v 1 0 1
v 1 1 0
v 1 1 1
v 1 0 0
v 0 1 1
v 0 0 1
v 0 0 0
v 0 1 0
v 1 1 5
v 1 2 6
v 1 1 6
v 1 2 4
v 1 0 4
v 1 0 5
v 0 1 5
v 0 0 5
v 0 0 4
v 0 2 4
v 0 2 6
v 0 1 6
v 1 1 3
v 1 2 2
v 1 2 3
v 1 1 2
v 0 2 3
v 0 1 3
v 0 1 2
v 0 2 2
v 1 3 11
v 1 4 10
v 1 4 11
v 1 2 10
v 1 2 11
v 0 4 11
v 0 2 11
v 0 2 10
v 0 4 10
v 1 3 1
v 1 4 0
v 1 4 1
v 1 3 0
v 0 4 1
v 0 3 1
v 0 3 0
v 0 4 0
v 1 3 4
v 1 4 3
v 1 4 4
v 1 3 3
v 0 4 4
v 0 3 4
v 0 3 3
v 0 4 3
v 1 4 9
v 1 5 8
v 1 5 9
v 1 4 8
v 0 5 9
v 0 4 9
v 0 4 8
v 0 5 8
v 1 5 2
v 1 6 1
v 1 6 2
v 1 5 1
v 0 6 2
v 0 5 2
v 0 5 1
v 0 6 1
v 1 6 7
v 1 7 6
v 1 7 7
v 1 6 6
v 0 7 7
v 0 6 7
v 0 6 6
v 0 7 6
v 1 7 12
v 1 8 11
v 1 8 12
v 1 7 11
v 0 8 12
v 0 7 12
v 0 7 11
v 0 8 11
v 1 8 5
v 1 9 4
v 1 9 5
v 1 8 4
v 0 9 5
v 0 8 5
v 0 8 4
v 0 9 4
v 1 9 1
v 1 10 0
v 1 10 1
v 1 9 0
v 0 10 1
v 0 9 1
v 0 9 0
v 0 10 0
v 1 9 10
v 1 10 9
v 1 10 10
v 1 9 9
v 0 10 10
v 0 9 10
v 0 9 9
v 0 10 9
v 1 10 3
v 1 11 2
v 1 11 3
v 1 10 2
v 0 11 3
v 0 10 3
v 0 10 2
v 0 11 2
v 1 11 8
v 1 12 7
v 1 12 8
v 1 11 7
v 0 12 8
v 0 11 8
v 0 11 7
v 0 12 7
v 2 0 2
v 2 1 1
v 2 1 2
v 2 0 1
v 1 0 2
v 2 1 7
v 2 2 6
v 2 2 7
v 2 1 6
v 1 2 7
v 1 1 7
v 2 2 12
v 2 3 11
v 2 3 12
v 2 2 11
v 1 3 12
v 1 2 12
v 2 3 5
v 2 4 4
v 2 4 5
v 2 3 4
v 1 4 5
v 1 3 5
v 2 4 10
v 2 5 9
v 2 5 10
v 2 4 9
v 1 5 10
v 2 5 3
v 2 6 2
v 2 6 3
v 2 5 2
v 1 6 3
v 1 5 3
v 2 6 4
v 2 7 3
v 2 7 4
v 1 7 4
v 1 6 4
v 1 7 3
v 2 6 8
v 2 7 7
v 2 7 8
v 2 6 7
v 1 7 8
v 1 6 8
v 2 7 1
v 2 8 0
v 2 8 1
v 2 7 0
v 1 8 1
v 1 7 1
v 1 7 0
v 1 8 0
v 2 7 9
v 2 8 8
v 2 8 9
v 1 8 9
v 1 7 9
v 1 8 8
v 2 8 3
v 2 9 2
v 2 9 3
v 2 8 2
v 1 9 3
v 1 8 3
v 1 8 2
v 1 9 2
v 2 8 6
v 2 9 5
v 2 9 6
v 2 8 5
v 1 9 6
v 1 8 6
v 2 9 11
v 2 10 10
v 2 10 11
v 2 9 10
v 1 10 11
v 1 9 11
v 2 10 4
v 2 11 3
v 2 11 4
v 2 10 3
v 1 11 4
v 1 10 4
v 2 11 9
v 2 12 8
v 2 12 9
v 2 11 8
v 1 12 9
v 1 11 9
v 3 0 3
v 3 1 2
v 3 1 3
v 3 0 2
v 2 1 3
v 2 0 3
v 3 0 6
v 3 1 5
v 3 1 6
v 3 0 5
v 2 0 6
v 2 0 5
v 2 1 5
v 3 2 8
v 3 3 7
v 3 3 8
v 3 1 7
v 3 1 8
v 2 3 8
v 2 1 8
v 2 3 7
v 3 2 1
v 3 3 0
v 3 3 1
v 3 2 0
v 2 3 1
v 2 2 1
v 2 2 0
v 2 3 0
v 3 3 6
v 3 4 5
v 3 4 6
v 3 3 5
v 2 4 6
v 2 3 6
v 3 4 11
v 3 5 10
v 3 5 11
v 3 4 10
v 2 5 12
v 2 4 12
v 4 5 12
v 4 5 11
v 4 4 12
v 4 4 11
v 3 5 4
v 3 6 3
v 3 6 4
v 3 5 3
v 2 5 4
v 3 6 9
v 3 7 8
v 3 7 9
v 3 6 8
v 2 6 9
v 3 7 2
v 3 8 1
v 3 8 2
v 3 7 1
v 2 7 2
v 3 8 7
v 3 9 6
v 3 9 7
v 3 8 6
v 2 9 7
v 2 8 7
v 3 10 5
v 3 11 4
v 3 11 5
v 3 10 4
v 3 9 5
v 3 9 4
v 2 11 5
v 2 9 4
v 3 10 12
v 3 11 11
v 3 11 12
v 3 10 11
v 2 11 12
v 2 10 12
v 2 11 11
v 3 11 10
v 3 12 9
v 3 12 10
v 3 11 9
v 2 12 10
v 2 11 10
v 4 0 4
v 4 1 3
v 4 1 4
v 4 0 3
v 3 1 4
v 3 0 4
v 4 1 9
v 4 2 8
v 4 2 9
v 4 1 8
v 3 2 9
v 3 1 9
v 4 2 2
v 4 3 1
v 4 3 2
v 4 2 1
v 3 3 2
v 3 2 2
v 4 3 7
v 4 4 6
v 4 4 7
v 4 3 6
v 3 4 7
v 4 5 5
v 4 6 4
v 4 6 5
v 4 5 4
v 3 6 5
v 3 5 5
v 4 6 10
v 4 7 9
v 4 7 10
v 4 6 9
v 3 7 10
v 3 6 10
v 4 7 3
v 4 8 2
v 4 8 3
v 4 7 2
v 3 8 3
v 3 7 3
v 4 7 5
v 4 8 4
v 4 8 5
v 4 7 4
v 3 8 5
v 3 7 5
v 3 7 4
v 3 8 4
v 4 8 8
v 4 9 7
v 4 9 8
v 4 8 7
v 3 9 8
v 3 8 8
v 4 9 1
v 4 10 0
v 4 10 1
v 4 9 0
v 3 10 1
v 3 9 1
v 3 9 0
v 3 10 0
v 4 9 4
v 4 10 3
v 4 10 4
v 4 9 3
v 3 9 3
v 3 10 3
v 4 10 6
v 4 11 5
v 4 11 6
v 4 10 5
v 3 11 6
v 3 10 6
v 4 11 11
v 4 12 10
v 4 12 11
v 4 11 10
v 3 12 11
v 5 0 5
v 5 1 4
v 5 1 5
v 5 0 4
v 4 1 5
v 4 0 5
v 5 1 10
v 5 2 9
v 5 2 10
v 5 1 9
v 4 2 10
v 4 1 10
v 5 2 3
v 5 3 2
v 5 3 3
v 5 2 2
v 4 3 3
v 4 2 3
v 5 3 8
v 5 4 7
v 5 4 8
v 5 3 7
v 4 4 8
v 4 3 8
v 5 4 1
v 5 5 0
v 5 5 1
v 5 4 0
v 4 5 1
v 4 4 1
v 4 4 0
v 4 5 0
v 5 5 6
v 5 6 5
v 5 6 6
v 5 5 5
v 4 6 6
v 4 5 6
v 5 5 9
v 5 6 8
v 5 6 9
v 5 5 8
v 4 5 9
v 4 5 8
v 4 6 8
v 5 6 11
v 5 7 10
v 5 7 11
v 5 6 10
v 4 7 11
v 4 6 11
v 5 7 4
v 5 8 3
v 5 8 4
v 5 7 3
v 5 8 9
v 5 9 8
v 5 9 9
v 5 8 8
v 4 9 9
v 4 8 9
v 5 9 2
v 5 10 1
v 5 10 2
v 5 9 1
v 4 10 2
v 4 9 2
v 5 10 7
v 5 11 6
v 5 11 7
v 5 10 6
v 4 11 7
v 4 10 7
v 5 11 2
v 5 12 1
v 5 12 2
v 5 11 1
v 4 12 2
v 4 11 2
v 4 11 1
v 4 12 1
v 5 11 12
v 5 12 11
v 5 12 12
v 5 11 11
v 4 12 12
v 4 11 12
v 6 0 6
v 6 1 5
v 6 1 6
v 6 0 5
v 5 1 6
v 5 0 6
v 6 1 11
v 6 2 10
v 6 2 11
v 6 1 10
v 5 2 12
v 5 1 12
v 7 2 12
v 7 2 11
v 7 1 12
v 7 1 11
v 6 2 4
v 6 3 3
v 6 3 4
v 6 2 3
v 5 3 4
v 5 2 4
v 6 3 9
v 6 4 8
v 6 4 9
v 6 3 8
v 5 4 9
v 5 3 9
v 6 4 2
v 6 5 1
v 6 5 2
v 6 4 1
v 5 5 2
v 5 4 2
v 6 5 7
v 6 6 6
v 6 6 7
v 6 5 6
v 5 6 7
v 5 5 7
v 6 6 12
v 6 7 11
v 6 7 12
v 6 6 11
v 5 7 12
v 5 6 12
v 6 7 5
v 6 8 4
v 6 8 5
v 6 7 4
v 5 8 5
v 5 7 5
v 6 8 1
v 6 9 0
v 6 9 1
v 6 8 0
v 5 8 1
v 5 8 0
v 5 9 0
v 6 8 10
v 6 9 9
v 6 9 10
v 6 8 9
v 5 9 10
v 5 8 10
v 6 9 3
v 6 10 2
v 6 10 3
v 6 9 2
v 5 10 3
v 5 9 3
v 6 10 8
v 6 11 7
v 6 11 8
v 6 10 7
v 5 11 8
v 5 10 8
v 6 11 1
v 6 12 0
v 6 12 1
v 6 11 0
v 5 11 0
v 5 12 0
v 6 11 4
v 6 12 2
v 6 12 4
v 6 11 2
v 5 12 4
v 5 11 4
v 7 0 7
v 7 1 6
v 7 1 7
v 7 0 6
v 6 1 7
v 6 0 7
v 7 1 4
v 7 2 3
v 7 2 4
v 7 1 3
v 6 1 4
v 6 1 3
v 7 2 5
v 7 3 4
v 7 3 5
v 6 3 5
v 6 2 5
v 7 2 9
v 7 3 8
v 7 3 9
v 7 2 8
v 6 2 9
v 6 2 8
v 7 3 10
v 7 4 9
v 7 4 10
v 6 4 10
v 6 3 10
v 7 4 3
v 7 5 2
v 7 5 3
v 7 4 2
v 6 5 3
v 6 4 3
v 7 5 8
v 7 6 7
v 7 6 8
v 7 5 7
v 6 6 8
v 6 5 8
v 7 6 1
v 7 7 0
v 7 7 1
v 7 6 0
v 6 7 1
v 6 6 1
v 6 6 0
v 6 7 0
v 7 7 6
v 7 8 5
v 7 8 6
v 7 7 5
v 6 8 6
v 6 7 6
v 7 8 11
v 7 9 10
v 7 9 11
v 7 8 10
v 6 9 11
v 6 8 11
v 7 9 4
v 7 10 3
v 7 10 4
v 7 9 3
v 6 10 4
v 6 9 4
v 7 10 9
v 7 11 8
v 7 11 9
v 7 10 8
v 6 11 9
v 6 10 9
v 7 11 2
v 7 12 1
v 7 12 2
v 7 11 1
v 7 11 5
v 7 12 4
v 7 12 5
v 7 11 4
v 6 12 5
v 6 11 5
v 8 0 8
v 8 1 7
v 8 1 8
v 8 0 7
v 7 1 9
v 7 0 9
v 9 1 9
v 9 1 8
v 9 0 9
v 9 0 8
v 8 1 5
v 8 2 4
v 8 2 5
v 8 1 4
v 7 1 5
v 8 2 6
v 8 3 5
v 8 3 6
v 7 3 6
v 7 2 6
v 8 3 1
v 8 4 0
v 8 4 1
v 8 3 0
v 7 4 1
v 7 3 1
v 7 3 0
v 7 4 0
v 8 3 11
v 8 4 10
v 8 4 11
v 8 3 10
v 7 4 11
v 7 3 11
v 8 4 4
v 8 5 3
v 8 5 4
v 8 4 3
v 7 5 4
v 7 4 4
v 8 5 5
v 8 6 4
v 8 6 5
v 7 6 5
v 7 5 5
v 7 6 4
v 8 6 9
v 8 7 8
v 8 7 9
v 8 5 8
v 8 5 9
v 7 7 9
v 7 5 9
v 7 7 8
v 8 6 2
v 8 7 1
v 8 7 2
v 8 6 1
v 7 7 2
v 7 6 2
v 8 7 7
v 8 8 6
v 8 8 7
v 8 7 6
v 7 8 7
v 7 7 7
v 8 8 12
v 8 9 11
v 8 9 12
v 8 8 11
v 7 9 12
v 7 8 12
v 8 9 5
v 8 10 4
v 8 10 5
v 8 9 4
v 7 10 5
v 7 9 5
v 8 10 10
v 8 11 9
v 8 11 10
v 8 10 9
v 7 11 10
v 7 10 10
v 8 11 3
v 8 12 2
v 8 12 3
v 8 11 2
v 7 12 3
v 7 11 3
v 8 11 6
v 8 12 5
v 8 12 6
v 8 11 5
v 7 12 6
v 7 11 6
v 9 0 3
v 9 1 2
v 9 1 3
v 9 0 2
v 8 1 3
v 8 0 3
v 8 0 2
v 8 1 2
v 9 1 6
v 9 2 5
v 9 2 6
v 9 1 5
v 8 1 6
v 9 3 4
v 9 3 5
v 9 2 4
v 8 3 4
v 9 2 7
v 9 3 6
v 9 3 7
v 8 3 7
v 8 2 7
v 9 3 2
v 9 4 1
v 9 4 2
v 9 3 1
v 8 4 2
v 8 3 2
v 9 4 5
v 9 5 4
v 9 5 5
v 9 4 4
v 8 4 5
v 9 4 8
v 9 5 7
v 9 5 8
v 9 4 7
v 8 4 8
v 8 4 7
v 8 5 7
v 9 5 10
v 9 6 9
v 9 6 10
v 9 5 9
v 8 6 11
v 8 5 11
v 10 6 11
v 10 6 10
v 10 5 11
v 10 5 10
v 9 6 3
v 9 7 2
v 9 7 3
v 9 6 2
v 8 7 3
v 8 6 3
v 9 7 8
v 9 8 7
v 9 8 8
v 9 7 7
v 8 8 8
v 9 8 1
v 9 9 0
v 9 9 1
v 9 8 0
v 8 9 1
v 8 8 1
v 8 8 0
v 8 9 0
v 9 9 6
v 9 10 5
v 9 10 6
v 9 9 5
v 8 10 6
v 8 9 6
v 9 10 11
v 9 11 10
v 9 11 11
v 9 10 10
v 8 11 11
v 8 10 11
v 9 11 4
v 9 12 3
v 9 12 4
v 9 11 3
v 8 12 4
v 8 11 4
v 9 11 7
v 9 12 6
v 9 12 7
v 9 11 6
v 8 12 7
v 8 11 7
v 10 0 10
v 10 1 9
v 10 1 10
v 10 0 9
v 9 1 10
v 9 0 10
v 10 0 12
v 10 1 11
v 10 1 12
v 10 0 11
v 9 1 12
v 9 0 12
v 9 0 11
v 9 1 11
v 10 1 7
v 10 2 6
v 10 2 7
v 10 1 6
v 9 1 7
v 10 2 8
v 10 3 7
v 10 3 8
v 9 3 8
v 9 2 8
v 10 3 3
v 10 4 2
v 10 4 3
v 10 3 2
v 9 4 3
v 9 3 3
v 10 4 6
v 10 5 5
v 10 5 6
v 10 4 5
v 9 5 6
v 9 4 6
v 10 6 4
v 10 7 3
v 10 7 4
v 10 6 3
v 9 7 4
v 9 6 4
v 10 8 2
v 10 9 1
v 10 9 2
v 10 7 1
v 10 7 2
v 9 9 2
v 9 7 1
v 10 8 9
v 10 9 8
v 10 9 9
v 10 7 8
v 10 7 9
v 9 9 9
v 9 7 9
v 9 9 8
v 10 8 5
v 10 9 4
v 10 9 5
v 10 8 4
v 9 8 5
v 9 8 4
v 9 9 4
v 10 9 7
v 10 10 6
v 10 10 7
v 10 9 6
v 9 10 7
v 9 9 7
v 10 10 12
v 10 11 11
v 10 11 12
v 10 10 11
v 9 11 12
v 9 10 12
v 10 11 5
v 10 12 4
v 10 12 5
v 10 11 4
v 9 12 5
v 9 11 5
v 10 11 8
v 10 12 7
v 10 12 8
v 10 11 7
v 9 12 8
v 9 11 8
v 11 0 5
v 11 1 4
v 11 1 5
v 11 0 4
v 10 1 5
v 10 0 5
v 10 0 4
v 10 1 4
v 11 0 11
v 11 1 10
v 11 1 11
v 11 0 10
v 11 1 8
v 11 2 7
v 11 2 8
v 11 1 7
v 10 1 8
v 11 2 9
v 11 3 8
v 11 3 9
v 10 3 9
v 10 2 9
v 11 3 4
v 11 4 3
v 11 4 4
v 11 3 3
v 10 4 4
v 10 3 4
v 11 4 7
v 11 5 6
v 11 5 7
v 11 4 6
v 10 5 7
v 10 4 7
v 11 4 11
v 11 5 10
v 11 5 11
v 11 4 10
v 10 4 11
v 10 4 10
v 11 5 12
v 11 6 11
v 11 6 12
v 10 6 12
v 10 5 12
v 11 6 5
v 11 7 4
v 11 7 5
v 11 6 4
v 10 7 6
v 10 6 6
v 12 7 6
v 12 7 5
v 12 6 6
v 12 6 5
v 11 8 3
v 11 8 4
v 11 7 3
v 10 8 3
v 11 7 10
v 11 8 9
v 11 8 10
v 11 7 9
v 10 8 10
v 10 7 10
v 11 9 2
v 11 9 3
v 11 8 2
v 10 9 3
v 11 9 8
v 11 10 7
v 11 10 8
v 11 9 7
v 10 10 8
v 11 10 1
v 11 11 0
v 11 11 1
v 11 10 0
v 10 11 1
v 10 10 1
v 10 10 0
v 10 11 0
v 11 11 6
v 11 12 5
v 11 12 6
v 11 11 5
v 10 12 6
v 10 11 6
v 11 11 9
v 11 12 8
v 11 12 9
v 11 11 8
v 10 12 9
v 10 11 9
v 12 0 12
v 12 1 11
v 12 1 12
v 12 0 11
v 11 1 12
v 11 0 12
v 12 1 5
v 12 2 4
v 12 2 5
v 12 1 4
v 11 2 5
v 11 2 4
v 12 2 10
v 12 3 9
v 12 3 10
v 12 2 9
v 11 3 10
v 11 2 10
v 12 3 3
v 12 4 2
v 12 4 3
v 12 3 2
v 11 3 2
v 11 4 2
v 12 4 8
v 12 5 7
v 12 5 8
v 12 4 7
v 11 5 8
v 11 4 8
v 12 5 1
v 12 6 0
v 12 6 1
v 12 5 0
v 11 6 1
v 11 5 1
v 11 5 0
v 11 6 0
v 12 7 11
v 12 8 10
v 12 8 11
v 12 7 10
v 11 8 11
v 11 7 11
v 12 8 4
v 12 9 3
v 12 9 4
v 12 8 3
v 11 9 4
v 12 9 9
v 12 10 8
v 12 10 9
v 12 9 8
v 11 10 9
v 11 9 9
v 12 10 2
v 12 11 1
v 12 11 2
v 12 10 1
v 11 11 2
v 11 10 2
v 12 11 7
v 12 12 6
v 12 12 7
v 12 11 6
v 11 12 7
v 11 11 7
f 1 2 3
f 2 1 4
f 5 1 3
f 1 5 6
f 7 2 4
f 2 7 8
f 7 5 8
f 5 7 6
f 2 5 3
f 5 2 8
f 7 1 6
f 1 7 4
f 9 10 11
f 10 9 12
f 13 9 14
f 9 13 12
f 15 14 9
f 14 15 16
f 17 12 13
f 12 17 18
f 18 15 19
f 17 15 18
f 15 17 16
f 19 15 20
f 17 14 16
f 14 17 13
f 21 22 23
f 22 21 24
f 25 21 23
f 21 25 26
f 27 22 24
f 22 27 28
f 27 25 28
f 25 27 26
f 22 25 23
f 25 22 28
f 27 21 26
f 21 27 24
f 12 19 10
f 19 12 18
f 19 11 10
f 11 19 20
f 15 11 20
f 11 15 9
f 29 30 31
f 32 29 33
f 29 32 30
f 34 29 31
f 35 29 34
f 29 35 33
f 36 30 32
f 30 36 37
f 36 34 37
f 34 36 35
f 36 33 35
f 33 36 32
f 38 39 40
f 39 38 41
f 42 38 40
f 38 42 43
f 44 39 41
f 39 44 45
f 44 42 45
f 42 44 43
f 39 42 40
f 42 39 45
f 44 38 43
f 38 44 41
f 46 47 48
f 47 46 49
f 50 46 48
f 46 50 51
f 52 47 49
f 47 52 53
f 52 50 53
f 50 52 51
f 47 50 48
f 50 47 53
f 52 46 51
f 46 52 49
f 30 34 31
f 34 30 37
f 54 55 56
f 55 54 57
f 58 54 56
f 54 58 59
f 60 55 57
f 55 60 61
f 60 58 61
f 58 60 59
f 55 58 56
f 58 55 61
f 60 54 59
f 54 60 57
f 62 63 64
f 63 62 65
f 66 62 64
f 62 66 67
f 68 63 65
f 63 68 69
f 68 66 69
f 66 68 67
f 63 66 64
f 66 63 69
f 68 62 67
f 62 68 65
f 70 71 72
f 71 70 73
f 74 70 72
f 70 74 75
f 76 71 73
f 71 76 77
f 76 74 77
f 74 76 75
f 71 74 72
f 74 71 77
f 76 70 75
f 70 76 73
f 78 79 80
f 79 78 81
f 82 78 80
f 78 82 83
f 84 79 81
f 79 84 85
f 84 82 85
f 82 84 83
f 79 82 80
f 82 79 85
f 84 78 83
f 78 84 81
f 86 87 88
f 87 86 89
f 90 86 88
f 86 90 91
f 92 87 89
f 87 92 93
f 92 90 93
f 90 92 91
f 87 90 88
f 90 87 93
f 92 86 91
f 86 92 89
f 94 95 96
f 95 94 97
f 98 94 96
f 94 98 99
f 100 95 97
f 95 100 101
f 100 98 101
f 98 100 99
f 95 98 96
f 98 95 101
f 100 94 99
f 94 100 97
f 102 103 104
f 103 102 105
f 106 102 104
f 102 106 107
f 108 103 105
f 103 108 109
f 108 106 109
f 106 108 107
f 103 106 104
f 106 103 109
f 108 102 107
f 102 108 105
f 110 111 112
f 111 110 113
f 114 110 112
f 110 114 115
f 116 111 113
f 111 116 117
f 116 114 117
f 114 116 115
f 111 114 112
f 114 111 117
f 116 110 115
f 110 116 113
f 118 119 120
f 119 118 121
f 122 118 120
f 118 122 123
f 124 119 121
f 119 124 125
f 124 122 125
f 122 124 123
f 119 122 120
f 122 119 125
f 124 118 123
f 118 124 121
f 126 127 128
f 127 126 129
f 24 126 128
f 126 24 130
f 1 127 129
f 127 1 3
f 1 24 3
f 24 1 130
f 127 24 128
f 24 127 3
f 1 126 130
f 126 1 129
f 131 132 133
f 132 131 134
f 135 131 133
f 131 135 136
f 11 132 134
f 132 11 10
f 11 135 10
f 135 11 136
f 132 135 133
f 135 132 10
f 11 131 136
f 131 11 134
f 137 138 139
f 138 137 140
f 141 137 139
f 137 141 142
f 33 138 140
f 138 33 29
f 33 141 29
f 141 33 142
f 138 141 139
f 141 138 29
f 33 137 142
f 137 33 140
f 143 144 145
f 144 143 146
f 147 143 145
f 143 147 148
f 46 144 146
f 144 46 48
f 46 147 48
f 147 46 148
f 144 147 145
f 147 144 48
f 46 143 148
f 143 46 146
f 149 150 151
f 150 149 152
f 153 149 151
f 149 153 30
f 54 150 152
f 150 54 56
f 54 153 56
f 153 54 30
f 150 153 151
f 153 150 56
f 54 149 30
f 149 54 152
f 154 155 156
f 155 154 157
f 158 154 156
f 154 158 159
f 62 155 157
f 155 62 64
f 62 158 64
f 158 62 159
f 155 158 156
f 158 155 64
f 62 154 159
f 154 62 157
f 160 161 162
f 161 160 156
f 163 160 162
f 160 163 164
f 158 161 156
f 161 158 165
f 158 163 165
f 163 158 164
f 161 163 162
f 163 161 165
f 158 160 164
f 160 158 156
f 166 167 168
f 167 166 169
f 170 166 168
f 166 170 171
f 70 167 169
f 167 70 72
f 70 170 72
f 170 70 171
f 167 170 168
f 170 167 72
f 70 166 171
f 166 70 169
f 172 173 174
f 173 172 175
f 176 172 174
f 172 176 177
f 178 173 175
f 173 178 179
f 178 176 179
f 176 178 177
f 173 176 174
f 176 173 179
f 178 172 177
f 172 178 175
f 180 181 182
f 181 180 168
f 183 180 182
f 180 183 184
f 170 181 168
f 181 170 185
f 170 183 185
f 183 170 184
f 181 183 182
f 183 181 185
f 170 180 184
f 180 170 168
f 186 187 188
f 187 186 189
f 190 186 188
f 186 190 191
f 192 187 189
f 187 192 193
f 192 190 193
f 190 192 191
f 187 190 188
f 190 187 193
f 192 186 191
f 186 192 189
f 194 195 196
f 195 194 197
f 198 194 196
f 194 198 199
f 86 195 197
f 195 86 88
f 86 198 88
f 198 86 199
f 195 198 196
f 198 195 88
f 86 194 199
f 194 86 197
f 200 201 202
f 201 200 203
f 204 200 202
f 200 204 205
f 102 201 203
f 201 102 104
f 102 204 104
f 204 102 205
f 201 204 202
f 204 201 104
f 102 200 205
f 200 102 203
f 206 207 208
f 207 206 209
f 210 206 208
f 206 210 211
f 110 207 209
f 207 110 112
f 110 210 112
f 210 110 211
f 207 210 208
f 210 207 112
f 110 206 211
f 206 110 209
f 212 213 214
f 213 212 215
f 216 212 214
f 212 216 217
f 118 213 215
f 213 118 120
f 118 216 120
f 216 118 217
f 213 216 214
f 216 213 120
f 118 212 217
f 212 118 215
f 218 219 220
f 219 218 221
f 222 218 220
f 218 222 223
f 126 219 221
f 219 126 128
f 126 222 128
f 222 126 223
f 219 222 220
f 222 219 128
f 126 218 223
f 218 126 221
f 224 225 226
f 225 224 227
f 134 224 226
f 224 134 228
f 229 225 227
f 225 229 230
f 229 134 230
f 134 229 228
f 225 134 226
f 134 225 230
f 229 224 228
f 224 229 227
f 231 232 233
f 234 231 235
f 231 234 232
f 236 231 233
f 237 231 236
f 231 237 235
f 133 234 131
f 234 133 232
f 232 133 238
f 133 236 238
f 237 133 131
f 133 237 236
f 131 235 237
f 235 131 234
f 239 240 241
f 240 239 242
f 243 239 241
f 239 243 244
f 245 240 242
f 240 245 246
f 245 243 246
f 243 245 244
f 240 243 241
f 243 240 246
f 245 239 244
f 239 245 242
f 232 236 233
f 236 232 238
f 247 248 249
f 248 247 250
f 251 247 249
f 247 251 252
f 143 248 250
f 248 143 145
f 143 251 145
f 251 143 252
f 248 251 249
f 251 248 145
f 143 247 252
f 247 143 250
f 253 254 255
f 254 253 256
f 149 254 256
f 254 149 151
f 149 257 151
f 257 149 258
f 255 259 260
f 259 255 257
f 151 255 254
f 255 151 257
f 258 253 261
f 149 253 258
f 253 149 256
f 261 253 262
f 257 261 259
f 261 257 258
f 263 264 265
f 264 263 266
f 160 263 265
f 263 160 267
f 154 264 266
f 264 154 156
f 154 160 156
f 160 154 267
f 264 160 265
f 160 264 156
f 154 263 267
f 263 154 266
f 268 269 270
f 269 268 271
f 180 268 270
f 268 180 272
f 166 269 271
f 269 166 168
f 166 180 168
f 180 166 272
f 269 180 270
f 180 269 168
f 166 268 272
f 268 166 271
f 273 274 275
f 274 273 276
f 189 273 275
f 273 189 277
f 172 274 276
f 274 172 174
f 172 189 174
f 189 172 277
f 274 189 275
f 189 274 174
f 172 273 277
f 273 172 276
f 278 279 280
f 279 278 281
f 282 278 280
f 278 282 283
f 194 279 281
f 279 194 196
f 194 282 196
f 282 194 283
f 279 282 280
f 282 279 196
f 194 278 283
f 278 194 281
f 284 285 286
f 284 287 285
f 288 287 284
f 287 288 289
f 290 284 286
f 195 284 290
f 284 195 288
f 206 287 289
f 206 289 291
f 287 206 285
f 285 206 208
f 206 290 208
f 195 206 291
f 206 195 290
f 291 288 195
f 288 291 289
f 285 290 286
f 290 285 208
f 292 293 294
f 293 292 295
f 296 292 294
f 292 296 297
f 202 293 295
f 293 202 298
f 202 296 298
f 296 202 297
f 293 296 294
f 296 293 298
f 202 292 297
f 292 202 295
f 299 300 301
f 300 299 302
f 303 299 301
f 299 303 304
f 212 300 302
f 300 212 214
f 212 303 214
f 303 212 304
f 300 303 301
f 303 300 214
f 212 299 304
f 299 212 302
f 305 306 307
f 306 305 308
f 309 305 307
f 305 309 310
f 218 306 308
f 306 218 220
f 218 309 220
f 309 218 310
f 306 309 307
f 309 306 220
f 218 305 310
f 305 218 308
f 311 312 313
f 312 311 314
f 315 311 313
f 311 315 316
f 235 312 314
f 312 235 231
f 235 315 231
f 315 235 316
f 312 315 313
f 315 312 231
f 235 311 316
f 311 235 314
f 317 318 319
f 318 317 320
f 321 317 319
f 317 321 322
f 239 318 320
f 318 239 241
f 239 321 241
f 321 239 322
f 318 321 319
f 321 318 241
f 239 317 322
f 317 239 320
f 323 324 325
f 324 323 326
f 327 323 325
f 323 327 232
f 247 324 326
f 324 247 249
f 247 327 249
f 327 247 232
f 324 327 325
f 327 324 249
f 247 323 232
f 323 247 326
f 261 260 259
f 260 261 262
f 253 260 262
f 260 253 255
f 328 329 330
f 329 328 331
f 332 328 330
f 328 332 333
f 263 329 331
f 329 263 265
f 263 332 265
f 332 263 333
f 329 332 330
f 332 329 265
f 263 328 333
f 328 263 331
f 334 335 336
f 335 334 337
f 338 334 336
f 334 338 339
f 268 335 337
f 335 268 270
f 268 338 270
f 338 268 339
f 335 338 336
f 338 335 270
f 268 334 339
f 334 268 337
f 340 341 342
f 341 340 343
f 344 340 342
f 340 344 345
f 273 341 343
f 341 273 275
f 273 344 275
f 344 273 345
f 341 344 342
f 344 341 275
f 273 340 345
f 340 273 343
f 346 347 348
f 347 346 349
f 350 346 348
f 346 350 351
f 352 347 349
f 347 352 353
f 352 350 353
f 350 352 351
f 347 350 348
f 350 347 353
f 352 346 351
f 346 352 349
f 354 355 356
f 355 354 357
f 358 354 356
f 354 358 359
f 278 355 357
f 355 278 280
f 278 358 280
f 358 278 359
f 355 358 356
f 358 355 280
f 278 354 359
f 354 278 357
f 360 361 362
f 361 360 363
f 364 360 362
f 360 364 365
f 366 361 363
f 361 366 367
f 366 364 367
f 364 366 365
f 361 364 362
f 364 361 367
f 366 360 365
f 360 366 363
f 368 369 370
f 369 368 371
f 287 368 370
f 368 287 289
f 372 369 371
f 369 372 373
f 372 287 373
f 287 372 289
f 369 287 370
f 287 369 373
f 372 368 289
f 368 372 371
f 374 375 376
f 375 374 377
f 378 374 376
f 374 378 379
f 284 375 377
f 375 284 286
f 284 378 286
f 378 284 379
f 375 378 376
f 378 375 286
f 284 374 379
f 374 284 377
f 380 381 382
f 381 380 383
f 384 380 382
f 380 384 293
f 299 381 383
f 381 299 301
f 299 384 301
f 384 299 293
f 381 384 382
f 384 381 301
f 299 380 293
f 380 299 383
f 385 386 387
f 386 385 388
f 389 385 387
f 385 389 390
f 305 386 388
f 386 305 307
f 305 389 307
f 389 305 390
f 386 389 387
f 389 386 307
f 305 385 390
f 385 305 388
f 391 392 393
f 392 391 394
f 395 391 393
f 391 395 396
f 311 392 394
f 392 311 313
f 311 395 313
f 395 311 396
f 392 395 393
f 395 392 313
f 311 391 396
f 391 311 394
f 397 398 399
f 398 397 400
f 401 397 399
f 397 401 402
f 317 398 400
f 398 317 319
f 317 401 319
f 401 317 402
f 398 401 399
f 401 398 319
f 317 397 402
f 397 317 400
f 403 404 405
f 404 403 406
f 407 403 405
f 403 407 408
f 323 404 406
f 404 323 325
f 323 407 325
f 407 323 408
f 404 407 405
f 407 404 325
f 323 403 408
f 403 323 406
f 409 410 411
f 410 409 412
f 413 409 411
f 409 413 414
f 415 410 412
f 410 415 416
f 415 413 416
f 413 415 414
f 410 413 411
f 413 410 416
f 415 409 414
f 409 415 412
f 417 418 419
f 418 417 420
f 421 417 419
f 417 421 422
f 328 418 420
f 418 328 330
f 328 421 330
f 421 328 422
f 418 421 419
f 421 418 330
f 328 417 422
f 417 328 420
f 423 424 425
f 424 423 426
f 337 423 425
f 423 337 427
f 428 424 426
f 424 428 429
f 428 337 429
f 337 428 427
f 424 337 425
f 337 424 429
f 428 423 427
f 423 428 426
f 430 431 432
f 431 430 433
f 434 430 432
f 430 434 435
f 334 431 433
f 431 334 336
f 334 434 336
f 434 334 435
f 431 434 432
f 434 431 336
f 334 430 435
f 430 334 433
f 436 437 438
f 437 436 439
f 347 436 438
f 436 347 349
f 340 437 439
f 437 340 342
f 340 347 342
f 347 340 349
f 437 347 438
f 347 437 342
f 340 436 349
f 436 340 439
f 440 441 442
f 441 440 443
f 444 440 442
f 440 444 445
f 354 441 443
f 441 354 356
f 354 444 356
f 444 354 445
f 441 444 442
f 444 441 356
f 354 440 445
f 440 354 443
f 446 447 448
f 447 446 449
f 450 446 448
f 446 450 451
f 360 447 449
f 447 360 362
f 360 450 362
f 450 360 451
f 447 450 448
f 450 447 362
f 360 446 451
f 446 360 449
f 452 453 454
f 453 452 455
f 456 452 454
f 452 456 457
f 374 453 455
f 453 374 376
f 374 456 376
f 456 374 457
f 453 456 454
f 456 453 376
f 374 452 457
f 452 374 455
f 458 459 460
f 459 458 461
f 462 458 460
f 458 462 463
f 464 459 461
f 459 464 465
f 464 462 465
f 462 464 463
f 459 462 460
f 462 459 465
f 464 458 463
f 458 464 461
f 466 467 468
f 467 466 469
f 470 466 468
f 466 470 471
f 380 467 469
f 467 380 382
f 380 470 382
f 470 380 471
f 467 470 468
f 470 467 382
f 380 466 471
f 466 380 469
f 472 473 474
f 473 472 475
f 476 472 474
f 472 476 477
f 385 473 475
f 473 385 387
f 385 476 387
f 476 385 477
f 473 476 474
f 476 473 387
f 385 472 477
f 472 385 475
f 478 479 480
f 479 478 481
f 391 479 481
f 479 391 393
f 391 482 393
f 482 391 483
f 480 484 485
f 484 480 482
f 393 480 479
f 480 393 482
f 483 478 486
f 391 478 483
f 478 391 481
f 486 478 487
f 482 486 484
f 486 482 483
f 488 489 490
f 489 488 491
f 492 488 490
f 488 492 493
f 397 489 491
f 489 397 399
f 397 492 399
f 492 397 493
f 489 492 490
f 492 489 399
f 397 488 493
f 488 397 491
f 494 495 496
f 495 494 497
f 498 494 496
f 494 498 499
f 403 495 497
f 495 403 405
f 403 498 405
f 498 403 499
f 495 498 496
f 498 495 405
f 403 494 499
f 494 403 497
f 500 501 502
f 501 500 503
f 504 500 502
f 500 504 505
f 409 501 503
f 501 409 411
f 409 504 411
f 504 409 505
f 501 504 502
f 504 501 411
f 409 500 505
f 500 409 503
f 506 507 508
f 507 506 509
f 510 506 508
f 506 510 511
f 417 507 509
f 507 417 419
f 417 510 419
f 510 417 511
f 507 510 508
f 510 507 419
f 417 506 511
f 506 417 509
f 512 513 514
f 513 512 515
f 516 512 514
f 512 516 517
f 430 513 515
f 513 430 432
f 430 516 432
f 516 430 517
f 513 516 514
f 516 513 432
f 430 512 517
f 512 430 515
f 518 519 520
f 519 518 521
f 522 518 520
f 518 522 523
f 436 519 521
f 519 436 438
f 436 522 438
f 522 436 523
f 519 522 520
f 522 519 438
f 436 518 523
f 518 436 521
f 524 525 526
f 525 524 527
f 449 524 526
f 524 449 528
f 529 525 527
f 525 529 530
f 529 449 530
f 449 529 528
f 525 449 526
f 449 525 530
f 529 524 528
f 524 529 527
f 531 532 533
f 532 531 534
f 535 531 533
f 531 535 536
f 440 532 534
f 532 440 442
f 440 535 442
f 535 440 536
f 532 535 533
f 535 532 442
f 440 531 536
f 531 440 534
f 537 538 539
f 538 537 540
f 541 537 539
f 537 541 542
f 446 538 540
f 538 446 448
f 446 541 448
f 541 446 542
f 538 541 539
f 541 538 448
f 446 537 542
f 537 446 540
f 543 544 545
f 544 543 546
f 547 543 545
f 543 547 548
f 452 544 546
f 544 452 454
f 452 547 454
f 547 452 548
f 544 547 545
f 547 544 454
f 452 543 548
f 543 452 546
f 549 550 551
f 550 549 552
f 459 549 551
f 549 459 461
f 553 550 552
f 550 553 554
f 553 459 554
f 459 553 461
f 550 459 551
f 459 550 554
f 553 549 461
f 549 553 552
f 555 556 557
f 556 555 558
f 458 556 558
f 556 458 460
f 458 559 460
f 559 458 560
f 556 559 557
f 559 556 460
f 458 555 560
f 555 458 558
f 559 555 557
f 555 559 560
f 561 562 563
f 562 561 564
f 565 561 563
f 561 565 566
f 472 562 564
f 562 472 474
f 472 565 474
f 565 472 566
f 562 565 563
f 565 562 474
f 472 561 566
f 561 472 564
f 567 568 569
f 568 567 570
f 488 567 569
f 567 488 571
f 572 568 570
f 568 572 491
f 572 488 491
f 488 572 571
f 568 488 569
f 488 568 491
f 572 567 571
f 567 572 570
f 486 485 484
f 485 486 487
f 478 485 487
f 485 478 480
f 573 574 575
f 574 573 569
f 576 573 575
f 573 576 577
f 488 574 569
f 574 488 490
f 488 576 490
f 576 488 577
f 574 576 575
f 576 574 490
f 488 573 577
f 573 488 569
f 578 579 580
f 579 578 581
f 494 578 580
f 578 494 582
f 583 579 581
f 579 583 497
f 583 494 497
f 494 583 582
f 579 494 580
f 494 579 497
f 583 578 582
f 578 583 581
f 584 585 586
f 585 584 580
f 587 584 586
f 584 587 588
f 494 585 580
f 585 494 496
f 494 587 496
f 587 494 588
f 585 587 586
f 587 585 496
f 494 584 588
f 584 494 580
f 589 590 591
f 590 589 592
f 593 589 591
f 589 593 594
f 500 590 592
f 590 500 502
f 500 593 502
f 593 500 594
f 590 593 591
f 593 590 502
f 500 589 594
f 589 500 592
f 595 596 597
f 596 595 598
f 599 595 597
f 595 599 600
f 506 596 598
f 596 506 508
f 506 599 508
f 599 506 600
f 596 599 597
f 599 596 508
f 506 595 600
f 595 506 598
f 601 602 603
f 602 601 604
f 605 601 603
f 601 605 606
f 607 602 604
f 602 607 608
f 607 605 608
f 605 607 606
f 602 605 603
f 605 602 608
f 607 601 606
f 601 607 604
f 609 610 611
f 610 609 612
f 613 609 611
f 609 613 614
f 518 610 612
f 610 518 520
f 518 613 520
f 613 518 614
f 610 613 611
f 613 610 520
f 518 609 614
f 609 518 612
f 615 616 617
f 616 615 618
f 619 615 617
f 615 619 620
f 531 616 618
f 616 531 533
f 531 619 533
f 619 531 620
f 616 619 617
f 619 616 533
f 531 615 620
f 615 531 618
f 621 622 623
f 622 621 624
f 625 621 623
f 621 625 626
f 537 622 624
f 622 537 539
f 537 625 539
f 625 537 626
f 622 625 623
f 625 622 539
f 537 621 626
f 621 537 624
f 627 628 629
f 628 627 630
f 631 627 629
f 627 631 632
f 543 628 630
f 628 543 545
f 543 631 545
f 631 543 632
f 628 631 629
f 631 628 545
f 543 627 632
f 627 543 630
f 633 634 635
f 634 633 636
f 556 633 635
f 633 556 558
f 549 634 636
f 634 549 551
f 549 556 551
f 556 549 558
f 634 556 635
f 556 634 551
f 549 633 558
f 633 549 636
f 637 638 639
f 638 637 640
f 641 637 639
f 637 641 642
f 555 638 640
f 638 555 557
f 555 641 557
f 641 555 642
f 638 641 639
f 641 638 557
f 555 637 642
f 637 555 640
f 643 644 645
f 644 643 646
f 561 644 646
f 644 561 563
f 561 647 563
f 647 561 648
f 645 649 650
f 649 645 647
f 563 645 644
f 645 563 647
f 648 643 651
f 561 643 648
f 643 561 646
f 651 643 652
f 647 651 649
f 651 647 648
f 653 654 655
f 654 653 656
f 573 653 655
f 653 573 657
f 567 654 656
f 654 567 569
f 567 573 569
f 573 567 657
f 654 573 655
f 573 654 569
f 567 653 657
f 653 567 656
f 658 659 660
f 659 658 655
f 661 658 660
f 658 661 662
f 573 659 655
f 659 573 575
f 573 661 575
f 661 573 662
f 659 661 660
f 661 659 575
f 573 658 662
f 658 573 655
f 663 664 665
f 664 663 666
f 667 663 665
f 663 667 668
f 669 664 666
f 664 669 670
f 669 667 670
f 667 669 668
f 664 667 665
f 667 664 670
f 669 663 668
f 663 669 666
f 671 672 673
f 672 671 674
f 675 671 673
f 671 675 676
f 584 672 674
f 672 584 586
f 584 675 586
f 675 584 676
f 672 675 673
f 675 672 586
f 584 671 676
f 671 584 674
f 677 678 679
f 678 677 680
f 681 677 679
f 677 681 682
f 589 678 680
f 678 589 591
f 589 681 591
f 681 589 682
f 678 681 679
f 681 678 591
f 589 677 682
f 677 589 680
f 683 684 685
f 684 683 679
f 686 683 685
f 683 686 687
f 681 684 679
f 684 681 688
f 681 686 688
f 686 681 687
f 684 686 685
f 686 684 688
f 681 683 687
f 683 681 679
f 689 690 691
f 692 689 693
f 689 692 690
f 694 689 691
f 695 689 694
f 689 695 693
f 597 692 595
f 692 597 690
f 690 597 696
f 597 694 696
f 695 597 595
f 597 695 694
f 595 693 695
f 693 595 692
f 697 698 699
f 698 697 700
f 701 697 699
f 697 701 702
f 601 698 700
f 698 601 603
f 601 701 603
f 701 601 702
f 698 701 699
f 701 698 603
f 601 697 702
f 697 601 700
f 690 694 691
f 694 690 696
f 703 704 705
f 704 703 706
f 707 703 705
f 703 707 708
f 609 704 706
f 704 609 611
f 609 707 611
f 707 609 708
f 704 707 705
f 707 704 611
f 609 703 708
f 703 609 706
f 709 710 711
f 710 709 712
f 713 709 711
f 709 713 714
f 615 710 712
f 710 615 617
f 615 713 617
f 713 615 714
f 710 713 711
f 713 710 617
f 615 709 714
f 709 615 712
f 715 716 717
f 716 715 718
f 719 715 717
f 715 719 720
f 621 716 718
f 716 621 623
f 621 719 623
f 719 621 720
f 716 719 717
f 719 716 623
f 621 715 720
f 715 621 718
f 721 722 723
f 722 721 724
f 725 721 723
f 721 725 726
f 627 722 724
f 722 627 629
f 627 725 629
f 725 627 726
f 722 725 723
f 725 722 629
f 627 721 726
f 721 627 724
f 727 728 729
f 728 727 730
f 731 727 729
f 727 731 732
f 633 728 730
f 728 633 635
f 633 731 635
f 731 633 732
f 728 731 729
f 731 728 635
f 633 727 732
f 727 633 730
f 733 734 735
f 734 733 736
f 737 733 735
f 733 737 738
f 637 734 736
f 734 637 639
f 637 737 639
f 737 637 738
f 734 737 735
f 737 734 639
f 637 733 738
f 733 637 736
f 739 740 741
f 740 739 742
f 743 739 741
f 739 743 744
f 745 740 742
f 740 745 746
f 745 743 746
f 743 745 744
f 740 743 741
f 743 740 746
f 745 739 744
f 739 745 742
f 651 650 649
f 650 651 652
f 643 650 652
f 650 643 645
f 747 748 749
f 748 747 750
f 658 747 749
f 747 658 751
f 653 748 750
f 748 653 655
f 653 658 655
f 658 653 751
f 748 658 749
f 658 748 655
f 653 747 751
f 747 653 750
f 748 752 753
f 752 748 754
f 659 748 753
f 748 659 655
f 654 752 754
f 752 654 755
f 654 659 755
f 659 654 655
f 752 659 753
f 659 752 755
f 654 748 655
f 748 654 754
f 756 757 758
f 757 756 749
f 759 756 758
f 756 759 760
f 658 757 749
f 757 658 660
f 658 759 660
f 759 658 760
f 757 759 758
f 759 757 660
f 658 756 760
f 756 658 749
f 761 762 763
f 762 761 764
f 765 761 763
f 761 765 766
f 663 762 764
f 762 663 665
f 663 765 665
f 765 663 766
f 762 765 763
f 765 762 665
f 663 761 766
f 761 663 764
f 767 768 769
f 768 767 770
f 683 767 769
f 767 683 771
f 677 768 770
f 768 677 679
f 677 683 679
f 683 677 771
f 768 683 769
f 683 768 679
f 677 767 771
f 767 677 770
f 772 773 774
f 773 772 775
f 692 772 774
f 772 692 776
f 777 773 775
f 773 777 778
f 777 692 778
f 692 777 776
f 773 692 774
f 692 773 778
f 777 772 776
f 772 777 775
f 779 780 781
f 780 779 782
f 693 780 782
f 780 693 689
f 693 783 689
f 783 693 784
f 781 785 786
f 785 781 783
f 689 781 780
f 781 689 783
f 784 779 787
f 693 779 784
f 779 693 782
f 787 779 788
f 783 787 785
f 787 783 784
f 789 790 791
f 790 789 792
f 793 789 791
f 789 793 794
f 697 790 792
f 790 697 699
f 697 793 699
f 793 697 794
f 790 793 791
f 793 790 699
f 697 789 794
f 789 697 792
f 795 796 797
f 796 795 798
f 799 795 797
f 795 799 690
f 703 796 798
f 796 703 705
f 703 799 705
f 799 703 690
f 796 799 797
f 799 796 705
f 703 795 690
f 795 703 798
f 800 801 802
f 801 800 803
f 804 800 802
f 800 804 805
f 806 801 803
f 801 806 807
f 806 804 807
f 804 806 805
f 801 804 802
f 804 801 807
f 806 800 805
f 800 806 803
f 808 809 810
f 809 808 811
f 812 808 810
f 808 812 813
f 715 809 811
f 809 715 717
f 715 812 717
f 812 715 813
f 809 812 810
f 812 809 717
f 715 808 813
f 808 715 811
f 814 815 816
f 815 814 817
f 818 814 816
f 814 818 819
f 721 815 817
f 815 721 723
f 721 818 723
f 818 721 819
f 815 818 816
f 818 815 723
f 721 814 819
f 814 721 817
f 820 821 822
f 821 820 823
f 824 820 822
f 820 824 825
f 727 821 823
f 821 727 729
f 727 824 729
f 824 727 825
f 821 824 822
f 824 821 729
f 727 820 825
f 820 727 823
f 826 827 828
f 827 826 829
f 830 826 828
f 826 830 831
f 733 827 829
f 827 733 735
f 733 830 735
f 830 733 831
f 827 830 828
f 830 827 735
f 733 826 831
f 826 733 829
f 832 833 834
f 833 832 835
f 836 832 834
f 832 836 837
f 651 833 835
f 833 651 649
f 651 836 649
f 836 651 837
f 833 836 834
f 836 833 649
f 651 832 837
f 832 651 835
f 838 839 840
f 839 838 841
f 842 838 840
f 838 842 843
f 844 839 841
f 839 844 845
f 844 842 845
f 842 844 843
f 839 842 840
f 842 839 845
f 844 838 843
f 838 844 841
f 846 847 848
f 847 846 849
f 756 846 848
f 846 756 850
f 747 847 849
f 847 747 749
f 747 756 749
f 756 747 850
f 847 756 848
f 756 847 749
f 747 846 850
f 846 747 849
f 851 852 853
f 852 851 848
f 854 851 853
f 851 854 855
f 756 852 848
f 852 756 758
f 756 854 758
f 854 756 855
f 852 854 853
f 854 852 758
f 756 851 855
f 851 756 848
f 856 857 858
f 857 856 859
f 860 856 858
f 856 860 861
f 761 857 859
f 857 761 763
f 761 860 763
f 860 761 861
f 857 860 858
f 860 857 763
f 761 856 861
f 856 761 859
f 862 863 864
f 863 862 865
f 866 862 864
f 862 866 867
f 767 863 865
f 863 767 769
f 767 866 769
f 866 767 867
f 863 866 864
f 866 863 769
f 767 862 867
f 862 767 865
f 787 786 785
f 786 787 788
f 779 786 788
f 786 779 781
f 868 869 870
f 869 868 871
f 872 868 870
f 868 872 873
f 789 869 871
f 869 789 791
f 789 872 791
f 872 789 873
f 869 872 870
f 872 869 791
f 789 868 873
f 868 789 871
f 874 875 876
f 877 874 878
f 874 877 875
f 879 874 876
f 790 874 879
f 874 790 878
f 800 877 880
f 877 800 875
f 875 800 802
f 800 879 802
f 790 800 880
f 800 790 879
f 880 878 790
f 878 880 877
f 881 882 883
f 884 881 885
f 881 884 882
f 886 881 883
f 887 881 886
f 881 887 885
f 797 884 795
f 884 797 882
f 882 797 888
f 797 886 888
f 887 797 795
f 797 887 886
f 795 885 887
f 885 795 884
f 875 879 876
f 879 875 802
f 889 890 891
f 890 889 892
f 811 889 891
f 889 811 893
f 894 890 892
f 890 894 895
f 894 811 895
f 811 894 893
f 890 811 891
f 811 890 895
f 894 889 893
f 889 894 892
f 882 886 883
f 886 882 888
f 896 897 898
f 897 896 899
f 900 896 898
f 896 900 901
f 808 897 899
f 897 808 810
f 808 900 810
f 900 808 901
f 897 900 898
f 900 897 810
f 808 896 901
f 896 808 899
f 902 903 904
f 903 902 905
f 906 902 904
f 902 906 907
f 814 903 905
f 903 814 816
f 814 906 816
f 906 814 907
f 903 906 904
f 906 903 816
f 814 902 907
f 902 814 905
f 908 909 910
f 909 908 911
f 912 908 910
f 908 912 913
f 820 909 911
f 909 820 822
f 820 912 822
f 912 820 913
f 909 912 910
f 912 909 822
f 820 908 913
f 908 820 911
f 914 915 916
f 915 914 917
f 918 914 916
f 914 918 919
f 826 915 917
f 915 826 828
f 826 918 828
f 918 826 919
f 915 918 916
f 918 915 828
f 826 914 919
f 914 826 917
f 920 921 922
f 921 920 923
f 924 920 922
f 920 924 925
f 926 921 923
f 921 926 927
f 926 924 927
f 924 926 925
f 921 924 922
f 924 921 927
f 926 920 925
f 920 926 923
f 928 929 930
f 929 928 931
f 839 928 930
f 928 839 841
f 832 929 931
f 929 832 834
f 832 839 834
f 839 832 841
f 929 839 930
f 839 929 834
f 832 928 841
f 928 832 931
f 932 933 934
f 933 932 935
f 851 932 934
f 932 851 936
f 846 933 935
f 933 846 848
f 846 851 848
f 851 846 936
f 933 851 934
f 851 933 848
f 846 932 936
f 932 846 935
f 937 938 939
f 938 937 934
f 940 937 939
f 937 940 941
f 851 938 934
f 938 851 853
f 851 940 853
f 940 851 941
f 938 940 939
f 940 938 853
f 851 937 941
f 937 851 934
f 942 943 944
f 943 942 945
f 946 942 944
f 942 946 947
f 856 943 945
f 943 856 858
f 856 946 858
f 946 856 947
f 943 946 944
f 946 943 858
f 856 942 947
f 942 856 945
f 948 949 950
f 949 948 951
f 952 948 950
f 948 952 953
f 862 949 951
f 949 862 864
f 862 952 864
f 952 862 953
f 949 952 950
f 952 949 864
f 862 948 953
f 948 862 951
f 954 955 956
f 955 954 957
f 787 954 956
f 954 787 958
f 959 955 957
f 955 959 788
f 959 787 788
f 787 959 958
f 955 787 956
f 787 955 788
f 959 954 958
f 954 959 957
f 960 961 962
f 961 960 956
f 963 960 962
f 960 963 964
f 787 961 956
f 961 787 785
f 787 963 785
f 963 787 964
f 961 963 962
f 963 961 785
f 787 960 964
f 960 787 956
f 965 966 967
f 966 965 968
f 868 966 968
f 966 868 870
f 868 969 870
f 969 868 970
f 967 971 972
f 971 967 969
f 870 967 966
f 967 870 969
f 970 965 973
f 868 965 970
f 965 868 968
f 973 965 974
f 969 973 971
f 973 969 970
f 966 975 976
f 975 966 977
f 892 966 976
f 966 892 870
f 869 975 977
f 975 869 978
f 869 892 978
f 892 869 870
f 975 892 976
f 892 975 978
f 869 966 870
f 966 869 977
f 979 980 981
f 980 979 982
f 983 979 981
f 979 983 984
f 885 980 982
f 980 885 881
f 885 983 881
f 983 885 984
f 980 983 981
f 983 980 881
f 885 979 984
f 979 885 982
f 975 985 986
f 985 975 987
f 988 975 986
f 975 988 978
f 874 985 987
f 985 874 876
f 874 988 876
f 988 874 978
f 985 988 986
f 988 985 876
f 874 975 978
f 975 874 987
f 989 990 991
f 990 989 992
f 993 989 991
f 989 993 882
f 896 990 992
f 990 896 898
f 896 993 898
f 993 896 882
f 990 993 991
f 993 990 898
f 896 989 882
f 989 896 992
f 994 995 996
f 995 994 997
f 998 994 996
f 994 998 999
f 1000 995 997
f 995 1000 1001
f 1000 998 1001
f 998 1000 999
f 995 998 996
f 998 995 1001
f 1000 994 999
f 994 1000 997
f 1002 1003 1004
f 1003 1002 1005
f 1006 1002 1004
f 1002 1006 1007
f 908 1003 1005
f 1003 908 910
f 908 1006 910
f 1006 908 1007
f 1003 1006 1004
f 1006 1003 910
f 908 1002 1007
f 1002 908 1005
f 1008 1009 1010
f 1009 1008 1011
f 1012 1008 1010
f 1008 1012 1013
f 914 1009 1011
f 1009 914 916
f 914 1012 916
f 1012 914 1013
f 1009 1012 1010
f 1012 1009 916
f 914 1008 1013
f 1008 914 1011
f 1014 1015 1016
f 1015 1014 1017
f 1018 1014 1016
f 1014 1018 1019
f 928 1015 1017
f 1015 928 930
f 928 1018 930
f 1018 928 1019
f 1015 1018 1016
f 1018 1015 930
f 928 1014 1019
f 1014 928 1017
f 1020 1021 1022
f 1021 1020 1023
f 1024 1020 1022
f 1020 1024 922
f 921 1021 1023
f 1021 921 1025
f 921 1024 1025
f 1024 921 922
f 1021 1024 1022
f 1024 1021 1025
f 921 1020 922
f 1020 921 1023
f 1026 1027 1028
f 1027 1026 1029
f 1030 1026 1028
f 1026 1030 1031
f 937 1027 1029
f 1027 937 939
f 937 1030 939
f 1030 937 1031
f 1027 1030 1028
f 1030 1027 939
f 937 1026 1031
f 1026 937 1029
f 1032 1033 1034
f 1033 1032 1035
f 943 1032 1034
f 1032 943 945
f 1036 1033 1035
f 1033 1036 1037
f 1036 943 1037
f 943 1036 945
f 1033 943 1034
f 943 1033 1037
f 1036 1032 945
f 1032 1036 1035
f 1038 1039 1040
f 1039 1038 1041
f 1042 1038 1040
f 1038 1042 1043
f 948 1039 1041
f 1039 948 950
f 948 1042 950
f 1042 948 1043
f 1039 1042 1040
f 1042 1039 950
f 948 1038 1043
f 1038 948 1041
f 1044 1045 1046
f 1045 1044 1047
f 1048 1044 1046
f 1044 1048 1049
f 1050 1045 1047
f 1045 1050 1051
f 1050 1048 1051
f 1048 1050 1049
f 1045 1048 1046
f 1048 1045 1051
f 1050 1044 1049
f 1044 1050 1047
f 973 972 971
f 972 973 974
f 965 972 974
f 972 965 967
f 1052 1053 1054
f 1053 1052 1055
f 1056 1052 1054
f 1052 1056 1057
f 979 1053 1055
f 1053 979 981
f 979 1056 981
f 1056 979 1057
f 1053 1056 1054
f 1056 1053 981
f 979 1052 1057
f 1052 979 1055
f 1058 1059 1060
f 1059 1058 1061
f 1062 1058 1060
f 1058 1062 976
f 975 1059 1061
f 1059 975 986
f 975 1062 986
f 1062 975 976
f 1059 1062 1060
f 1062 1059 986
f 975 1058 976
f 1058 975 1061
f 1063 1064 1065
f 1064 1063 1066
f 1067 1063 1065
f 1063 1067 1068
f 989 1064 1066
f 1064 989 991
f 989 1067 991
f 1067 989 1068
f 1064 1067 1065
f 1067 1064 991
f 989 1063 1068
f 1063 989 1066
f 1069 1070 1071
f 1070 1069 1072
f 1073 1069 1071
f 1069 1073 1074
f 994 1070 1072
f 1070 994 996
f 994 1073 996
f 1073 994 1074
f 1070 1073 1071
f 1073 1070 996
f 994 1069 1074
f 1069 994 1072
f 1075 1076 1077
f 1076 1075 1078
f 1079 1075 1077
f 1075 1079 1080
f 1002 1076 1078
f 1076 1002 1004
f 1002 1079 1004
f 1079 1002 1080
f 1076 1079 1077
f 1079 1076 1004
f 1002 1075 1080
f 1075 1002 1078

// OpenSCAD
union() {
    translate([0, 0, 0]) cube([1, 1, 1]);
    translate([0, 0, 4]) cube([1, 1, 1]);
    translate([0, 1, 2]) cube([1, 1, 1]);
    translate([0, 1, 4]) cube([1, 1, 1]);
    translate([0, 1, 5]) cube([1, 1, 1]);
    translate([0, 2, 10]) cube([1, 1, 1]);
    translate([0, 3, 0]) cube([1, 1, 1]);
    translate([0, 3, 3]) cube([1, 1, 1]);
    translate([0, 3, 10]) cube([1, 1, 1]);
    translate([0, 4, 8]) cube([1, 1, 1]);
    translate([0, 5, 1]) cube([1, 1, 1]);
    translate([0, 6, 6]) cube([1, 1, 1]);
    translate([0, 7, 11]) cube([1, 1, 1]);
    translate([0, 8, 4]) cube([1, 1, 1]);
    translate([0, 9, 0]) cube([1, 1, 1]);
    translate([0, 9, 9]) cube([1, 1, 1]);
    translate([0, 10, 2]) cube([1, 1, 1]);
    translate([0, 11, 7]) cube([1, 1, 1]);
    translate([1, 0, 1]) cube([1, 1, 1]);
    translate([1, 1, 6]) cube([1, 1, 1]);
    translate([1, 2, 11]) cube([1, 1, 1]);
    translate([1, 3, 4]) cube([1, 1, 1]);
    translate([1, 4, 9]) cube([1, 1, 1]);
    translate([1, 5, 2]) cube([1, 1, 1]);
    translate([1, 6, 3]) cube([1, 1, 1]);
    translate([1, 6, 7]) cube([1, 1, 1]);
    translate([1, 7, 0]) cube([1, 1, 1]);
    translate([1, 7, 8]) cube([1, 1, 1]);
    translate([1, 8, 2]) cube([1, 1, 1]);
    translate([1, 8, 5]) cube([1, 1, 1]);
    translate([1, 9, 10]) cube([1, 1, 1]);
    translate([1, 10, 3]) cube([1, 1, 1]);
    translate([1, 11, 8]) cube([1, 1, 1]);
    translate([2, 0, 2]) cube([1, 1, 1]);
    translate([2, 0, 5]) cube([1, 1, 1]);
    translate([2, 1, 7]) cube([1, 1, 1]);
    translate([2, 2, 0]) cube([1, 1, 1]);
    translate([2, 2, 7]) cube([1, 1, 1]);
    translate([2, 3, 5]) cube([1, 1, 1]);
    translate([2, 4, 10]) cube([1, 1, 1]);
    translate([2, 4, 11]) cube([1, 1, 1]);
    translate([2, 5, 3]) cube([1, 1, 1]);
    translate([2, 6, 8]) cube([1, 1, 1]);
    translate([2, 7, 1]) cube([1, 1, 1]);
    translate([2, 8, 6]) cube([1, 1, 1]);
    translate([2, 9, 4]) cube([1, 1, 1]);
    translate([2, 10, 4]) cube([1, 1, 1]);
    translate([2, 10, 11]) cube([1, 1, 1]);
    translate([2, 11, 9]) cube([1, 1, 1]);
    translate([3, 0, 3]) cube([1, 1, 1]);
    translate([3, 1, 8]) cube([1, 1, 1]);
    translate([3, 2, 1]) cube([1, 1, 1]);
    translate([3, 3, 6]) cube([1, 1, 1]);
    translate([3, 4, 11]) cube([1, 1, 1]);
    translate([3, 5, 4]) cube([1, 1, 1]);
    translate([3, 6, 9]) cube([1, 1, 1]);
    translate([3, 7, 2]) cube([1, 1, 1]);
    translate([3, 7, 4]) cube([1, 1, 1]);
    translate([3, 8, 7]) cube([1, 1, 1]);
    translate([3, 9, 0]) cube([1, 1, 1]);
    translate([3, 9, 3]) cube([1, 1, 1]);
    translate([3, 10, 5]) cube([1, 1, 1]);
    translate([3, 11, 10]) cube([1, 1, 1]);
    translate([4, 0, 4]) cube([1, 1, 1]);
    translate([4, 1, 9]) cube([1, 1, 1]);
    translate([4, 2, 2]) cube([1, 1, 1]);
    translate([4, 3, 7]) cube([1, 1, 1]);
    translate([4, 4, 0]) cube([1, 1, 1]);
    translate([4, 5, 5]) cube([1, 1, 1]);
    translate([4, 5, 8]) cube([1, 1, 1]);
    translate([4, 6, 10]) cube([1, 1, 1]);
    translate([4, 7, 3]) cube([1, 1, 1]);
    translate([4, 8, 8]) cube([1, 1, 1]);
    translate([4, 9, 1]) cube([1, 1, 1]);
    translate([4, 10, 6]) cube([1, 1, 1]);
    translate([4, 11, 1]) cube([1, 1, 1]);
    translate([4, 11, 11]) cube([1, 1, 1]);
    translate([5, 0, 5]) cube([1, 1, 1]);
    translate([5, 1, 10]) cube([1, 1, 1]);
    translate([5, 1, 11]) cube([1, 1, 1]);
    translate([5, 2, 3]) cube([1, 1, 1]);
    translate([5, 3, 8]) cube([1, 1, 1]);
    translate([5, 4, 1]) cube([1, 1, 1]);
    translate([5, 5, 6]) cube([1, 1, 1]);
    translate([5, 6, 11]) cube([1, 1, 1]);
    translate([5, 7, 4]) cube([1, 1, 1]);
    translate([5, 8, 0]) cube([1, 1, 1]);
    translate([5, 8, 9]) cube([1, 1, 1]);
    translate([5, 9, 2]) cube([1, 1, 1]);
    translate([5, 10, 7]) cube([1, 1, 1]);
    translate([5, 11, 0]) cube([1, 1, 1]);
    translate([5, 11, 2]) cube([1, 1, 1]);
    translate([5, 11, 3]) cube([1, 1, 1]);
    translate([6, 0, 6]) cube([1, 1, 1]);
    translate([6, 1, 3]) cube([1, 1, 1]);
    translate([6, 1, 11]) cube([1, 1, 1]);
    translate([6, 2, 4]) cube([1, 1, 1]);
    translate([6, 2, 8]) cube([1, 1, 1]);
    translate([6, 3, 9]) cube([1, 1, 1]);
    translate([6, 4, 2]) cube([1, 1, 1]);
    translate([6, 5, 7]) cube([1, 1, 1]);
    translate([6, 6, 0]) cube([1, 1, 1]);
    translate([6, 7, 5]) cube([1, 1, 1]);
    translate([6, 8, 10]) cube([1, 1, 1]);
    translate([6, 9, 3]) cube([1, 1, 1]);
    translate([6, 10, 8]) cube([1, 1, 1]);
    translate([6, 11, 1]) cube([1, 1, 1]);
    translate([6, 11, 4]) cube([1, 1, 1]);
    translate([7, 0, 7]) cube([1, 1, 1]);
    translate([7, 0, 8]) cube([1, 1, 1]);
    translate([7, 1, 4]) cube([1, 1, 1]);
    translate([7, 2, 5]) cube([1, 1, 1]);
    translate([7, 3, 0]) cube([1, 1, 1]);
    translate([7, 3, 10]) cube([1, 1, 1]);
    translate([7, 4, 3]) cube([1, 1, 1]);
    translate([7, 5, 4]) cube([1, 1, 1]);
    translate([7, 5, 8]) cube([1, 1, 1]);
    translate([7, 6, 1]) cube([1, 1, 1]);
    translate([7, 6, 8]) cube([1, 1, 1]);
    translate([7, 7, 6]) cube([1, 1, 1]);
    translate([7, 8, 11]) cube([1, 1, 1]);
    translate([7, 9, 4]) cube([1, 1, 1]);
    translate([7, 10, 9]) cube([1, 1, 1]);
    translate([7, 11, 2]) cube([1, 1, 1]);
    translate([7, 11, 5]) cube([1, 1, 1]);
    translate([8, 0, 2]) cube([1, 1, 1]);
    translate([8, 0, 8]) cube([1, 1, 1]);
    translate([8, 1, 5]) cube([1, 1, 1]);
    translate([8, 2, 4]) cube([1, 1, 1]);
    translate([8, 2, 6]) cube([1, 1, 1]);
    translate([8, 3, 1]) cube([1, 1, 1]);
    translate([8, 4, 4]) cube([1, 1, 1]);
    translate([8, 4, 7]) cube([1, 1, 1]);
    translate([8, 5, 9]) cube([1, 1, 1]);
    translate([8, 5, 10]) cube([1, 1, 1]);
    translate([8, 6, 2]) cube([1, 1, 1]);
    translate([8, 7, 7]) cube([1, 1, 1]);
    translate([8, 8, 0]) cube([1, 1, 1]);
    translate([8, 9, 5]) cube([1, 1, 1]);
    translate([8, 10, 10]) cube([1, 1, 1]);
    translate([8, 11, 3]) cube([1, 1, 1]);
    translate([8, 11, 6]) cube([1, 1, 1]);
    translate([9, 0, 9]) cube([1, 1, 1]);
    translate([9, 0, 11]) cube([1, 1, 1]);
    translate([9, 1, 6]) cube([1, 1, 1]);
    translate([9, 2, 7]) cube([1, 1, 1]);
    translate([9, 3, 2]) cube([1, 1, 1]);
    translate([9, 4, 5]) cube([1, 1, 1]);
    translate([9, 5, 10]) cube([1, 1, 1]);
    translate([9, 6, 3]) cube([1, 1, 1]);
    translate([9, 7, 1]) cube([1, 1, 1]);
    translate([9, 7, 8]) cube([1, 1, 1]);
    translate([9, 8, 1]) cube([1, 1, 1]);
    translate([9, 8, 4]) cube([1, 1, 1]);
    translate([9, 8, 8]) cube([1, 1, 1]);
    translate([9, 9, 6]) cube([1, 1, 1]);
    translate([9, 10, 11]) cube([1, 1, 1]);
    translate([9, 11, 4]) cube([1, 1, 1]);
    translate([9, 11, 7]) cube([1, 1, 1]);
    translate([10, 0, 4]) cube([1, 1, 1]);
    translate([10, 0, 10]) cube([1, 1, 1]);
    translate([10, 1, 7]) cube([1, 1, 1]);
    translate([10, 2, 8]) cube([1, 1, 1]);
    translate([10, 3, 3]) cube([1, 1, 1]);
    translate([10, 4, 6]) cube([1, 1, 1]);
    translate([10, 4, 10]) cube([1, 1, 1]);
    translate([10, 5, 11]) cube([1, 1, 1]);
    translate([10, 6, 4]) cube([1, 1, 1]);
    translate([10, 6, 5]) cube([1, 1, 1]);
    translate([10, 7, 3]) cube([1, 1, 1]);
    translate([10, 7, 9]) cube([1, 1, 1]);
    translate([10, 8, 2]) cube([1, 1, 1]);
    translate([10, 9, 7]) cube([1, 1, 1]);
    translate([10, 10, 0]) cube([1, 1, 1]);
    translate([10, 11, 5]) cube([1, 1, 1]);
    translate([10, 11, 8]) cube([1, 1, 1]);
    translate([11, 0, 11]) cube([1, 1, 1]);
    translate([11, 1, 4]) cube([1, 1, 1]);
    translate([11, 2, 9]) cube([1, 1, 1]);
    translate([11, 3, 2]) cube([1, 1, 1]);
    translate([11, 4, 7]) cube([1, 1, 1]);
    translate([11, 5, 0]) cube([1, 1, 1]);
    translate([11, 6, 5]) cube([1, 1, 1]);
    translate([11, 7, 10]) cube([1, 1, 1]);
    translate([11, 8, 3]) cube([1, 1, 1]);
    translate([11, 9, 8]) cube([1, 1, 1]);
    translate([11, 10, 1]) cube([1, 1, 1]);
    translate([11, 11, 6]) cube([1, 1, 1]);
}
